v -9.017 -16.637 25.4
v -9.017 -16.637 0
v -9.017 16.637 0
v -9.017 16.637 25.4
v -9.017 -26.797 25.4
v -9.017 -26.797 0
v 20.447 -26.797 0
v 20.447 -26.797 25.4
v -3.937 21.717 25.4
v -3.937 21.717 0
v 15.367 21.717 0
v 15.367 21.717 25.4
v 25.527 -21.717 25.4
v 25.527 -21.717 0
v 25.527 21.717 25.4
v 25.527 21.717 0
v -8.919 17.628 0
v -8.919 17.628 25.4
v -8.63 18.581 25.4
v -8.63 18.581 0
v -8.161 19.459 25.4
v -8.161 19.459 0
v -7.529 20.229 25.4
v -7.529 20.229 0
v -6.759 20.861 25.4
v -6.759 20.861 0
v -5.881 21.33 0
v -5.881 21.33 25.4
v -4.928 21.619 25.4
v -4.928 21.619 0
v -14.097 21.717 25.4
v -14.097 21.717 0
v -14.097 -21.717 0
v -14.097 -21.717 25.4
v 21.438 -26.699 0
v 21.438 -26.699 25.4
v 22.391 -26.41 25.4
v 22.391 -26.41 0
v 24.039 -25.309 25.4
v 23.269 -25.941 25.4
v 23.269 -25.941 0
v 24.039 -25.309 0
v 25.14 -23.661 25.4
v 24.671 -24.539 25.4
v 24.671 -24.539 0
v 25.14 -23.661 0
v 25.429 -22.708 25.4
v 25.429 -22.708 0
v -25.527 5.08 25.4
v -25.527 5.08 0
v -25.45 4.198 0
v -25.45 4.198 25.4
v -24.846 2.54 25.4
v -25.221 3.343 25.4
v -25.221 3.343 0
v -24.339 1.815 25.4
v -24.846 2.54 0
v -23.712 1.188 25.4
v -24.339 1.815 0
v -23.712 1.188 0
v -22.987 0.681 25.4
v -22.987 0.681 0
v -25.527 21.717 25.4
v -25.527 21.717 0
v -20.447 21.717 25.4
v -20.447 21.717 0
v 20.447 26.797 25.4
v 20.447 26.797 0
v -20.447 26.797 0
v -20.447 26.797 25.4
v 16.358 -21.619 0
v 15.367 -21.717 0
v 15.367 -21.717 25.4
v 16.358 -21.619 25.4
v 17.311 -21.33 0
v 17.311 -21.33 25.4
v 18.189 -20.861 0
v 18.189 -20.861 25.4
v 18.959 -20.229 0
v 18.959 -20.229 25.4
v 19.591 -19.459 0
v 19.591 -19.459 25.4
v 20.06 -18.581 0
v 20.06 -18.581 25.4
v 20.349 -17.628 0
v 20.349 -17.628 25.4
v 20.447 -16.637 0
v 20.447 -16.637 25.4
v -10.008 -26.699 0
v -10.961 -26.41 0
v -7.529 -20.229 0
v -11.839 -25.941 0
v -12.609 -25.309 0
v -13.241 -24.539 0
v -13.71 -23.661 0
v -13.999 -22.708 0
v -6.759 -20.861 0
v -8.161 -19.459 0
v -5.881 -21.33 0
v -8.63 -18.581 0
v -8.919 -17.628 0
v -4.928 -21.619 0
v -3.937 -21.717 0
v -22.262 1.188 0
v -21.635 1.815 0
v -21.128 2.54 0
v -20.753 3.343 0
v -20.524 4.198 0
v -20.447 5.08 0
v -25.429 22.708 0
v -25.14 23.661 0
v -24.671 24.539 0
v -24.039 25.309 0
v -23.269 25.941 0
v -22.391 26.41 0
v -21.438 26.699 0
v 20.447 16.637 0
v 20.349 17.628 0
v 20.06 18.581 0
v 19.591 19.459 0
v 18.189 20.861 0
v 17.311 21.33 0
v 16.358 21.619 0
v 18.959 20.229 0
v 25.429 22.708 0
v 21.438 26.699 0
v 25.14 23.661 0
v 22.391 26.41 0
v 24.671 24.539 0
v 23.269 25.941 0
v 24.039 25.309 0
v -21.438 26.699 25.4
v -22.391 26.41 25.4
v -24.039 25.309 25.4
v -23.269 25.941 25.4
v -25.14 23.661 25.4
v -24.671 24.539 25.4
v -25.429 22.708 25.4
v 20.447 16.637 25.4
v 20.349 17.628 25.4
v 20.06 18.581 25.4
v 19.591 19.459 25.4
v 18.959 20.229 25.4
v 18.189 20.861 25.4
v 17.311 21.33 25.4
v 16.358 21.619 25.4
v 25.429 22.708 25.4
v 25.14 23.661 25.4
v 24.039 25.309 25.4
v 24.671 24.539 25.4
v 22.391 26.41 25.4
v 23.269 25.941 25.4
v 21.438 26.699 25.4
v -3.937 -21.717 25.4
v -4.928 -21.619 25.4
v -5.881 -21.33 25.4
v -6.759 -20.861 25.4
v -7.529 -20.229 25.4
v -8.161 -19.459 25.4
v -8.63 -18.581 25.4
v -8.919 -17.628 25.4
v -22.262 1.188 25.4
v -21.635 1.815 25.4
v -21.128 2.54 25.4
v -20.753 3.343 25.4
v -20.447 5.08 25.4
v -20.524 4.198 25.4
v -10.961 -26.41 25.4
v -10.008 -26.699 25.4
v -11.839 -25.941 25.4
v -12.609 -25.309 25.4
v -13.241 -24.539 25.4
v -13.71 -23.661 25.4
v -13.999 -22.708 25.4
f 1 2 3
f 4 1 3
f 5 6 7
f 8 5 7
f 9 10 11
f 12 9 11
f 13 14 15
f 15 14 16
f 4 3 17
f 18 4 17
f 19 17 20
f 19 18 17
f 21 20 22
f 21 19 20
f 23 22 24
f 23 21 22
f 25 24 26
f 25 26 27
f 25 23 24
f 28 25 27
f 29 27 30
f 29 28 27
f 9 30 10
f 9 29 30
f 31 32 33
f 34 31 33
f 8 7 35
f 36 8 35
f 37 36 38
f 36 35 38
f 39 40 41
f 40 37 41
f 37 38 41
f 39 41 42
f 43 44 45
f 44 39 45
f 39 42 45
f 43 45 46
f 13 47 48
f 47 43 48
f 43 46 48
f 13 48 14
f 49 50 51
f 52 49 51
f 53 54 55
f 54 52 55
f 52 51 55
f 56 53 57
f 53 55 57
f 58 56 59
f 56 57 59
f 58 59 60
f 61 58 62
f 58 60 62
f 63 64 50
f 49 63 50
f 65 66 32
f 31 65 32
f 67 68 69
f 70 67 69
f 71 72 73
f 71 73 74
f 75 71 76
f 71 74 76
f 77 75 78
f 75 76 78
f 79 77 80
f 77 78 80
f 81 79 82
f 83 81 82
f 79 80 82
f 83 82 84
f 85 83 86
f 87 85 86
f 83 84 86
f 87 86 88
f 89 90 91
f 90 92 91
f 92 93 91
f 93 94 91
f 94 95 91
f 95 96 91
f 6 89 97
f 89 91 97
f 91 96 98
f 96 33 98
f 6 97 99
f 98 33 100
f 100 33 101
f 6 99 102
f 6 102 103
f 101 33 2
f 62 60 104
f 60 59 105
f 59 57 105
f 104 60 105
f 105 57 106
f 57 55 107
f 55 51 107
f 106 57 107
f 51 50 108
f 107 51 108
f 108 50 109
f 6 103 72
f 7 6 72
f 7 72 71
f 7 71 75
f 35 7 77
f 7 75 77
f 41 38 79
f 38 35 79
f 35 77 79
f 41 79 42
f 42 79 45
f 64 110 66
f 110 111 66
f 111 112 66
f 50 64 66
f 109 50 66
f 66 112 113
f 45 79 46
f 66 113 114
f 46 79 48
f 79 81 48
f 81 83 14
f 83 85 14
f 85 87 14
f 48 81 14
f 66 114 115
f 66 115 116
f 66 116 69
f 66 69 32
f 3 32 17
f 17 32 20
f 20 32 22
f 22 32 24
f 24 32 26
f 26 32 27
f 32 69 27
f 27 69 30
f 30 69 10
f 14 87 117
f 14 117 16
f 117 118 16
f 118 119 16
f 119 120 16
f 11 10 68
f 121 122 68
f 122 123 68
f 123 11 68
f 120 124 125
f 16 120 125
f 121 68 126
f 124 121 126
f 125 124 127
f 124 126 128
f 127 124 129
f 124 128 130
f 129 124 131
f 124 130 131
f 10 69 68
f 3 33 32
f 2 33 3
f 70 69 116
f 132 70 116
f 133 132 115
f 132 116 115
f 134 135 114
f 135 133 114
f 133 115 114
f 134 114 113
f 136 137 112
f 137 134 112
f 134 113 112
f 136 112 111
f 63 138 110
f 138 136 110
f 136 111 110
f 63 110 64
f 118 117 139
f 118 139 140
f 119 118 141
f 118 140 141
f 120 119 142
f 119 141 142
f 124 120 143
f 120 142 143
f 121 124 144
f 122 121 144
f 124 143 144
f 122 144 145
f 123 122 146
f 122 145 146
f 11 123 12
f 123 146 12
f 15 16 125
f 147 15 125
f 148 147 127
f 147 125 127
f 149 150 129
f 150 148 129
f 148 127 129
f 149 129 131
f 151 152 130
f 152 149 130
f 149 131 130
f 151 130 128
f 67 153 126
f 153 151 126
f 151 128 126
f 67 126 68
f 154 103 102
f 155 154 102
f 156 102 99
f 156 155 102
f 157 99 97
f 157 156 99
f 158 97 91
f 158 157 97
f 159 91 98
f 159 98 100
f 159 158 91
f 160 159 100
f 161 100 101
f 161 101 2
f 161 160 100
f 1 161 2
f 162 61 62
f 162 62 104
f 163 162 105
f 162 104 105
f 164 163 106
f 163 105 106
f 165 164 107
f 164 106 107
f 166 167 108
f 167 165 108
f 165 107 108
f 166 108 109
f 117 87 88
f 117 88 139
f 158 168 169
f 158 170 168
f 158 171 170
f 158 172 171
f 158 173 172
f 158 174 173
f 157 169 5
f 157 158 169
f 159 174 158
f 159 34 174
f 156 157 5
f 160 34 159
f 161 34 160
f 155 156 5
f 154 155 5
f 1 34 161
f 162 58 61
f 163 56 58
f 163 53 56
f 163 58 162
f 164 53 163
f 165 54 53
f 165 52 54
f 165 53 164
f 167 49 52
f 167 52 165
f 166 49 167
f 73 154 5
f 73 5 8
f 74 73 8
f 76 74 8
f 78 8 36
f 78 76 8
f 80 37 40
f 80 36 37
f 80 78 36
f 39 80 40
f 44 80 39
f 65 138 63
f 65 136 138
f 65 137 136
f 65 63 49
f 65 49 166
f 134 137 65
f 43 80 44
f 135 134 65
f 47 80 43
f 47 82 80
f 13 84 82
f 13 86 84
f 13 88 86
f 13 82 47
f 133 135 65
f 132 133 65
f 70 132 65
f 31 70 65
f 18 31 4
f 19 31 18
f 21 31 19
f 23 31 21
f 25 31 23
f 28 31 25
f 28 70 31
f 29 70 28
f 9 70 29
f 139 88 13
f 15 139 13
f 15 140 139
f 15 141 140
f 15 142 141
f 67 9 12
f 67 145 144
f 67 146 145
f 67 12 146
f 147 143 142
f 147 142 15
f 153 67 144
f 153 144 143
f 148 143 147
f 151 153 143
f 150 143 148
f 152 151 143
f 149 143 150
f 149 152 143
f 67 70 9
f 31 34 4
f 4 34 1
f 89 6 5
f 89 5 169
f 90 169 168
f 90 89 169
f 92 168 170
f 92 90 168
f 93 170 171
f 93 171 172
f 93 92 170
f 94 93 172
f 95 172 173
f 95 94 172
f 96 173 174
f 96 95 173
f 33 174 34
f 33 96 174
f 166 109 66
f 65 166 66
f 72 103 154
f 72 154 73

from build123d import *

# Parameters (mm, degrees)
F0_W        = 29.464
F0_H        = 43.434
F1_DEPTH    = 25.4
F2_T1_DEPTH = 50.8
F3_R        = 5.08


# Not quite as in the source:
# - a fillet or chamfer that OpenCascade refuses, or shapes differently, is made with other operations: its cross-section is extruded or revolved along the edge and cut away or added


with BuildPart() as f1:
    # F0 (on Top) → F1 (new body)
    with BuildSketch(Plane.XY):
        Polygon((25.527, -26.797), (25.527, 26.797), (-25.527, 26.797), (-25.527, 0), (-20.447, 0), (-20.447, 21.717), (-14.097, 21.717), (-14.097, -26.797), align=None)
        with Locations((5.715, 0)):
            Rectangle(F0_W, F0_H, mode=Mode.SUBTRACT)
    extrude(amount=F1_DEPTH)

    # F2: fillet of radius 5.08 on 6 edges, made by hand

    # F2_s2 → F2_t1 (cut)
    with BuildSketch(Plane.XY.offset(-12.7)):
        with BuildLine():
            ThreePointArc((-20.447, 26.797), (-24.0391024484, 25.3091024484), (-25.527, 21.717))
            Line((-25.527, 21.717), (-25.527, 26.797))
            Line((-25.527, 26.797), (-20.447, 26.797))
        make_face()
        with BuildLine():
            ThreePointArc((25.527, 21.717), (24.0391024484, 25.3091024484), (20.447, 26.797))
            Line((20.447, 26.797), (25.527, 26.797))
            Line((25.527, 26.797), (25.527, 21.717))
        make_face()
        with BuildLine():
            ThreePointArc((-9.017, -26.797), (-12.6091024484, -25.3091024484), (-14.097, -21.717))
            Line((-14.097, -21.717), (-14.097, -26.797))
            Line((-14.097, -26.797), (-9.017, -26.797))
        make_face()
        with BuildLine():
            ThreePointArc((20.447, -26.797), (24.0391024484, -25.3091024484), (25.527, -21.717))
            Line((25.527, -21.717), (25.527, -26.797))
            Line((25.527, -26.797), (20.447, -26.797))
        make_face()
        with BuildLine():
            ThreePointArc((-25.527, 0), (-21.9348975516, 1.4878975516), (-20.447, 5.08))
            Line((-20.447, 5.08), (-20.447, 0))
            Line((-20.447, 0), (-25.527, 0))
        make_face()
        with BuildLine():
            ThreePointArc((-25.527, 5.08), (-24.0391024484, 1.4878975516), (-20.447, 0))
            Line((-20.447, 0), (-25.527, 0))
            Line((-25.527, 0), (-25.527, 5.08))
        make_face()
    extrude(amount=F2_T1_DEPTH, mode=Mode.SUBTRACT)

    # F3
    f3_edges = [f1.edges().sort_by_distance(p)[0] for p in [
        (-9.017, -21.717, 12.7),
        (20.447, -21.717, 12.7),
        (20.447, 21.717, 12.7),
        (-9.017, 21.717, 12.7),
    ]]
    fillet(f3_edges, radius=F3_R)


solid = f1.part
